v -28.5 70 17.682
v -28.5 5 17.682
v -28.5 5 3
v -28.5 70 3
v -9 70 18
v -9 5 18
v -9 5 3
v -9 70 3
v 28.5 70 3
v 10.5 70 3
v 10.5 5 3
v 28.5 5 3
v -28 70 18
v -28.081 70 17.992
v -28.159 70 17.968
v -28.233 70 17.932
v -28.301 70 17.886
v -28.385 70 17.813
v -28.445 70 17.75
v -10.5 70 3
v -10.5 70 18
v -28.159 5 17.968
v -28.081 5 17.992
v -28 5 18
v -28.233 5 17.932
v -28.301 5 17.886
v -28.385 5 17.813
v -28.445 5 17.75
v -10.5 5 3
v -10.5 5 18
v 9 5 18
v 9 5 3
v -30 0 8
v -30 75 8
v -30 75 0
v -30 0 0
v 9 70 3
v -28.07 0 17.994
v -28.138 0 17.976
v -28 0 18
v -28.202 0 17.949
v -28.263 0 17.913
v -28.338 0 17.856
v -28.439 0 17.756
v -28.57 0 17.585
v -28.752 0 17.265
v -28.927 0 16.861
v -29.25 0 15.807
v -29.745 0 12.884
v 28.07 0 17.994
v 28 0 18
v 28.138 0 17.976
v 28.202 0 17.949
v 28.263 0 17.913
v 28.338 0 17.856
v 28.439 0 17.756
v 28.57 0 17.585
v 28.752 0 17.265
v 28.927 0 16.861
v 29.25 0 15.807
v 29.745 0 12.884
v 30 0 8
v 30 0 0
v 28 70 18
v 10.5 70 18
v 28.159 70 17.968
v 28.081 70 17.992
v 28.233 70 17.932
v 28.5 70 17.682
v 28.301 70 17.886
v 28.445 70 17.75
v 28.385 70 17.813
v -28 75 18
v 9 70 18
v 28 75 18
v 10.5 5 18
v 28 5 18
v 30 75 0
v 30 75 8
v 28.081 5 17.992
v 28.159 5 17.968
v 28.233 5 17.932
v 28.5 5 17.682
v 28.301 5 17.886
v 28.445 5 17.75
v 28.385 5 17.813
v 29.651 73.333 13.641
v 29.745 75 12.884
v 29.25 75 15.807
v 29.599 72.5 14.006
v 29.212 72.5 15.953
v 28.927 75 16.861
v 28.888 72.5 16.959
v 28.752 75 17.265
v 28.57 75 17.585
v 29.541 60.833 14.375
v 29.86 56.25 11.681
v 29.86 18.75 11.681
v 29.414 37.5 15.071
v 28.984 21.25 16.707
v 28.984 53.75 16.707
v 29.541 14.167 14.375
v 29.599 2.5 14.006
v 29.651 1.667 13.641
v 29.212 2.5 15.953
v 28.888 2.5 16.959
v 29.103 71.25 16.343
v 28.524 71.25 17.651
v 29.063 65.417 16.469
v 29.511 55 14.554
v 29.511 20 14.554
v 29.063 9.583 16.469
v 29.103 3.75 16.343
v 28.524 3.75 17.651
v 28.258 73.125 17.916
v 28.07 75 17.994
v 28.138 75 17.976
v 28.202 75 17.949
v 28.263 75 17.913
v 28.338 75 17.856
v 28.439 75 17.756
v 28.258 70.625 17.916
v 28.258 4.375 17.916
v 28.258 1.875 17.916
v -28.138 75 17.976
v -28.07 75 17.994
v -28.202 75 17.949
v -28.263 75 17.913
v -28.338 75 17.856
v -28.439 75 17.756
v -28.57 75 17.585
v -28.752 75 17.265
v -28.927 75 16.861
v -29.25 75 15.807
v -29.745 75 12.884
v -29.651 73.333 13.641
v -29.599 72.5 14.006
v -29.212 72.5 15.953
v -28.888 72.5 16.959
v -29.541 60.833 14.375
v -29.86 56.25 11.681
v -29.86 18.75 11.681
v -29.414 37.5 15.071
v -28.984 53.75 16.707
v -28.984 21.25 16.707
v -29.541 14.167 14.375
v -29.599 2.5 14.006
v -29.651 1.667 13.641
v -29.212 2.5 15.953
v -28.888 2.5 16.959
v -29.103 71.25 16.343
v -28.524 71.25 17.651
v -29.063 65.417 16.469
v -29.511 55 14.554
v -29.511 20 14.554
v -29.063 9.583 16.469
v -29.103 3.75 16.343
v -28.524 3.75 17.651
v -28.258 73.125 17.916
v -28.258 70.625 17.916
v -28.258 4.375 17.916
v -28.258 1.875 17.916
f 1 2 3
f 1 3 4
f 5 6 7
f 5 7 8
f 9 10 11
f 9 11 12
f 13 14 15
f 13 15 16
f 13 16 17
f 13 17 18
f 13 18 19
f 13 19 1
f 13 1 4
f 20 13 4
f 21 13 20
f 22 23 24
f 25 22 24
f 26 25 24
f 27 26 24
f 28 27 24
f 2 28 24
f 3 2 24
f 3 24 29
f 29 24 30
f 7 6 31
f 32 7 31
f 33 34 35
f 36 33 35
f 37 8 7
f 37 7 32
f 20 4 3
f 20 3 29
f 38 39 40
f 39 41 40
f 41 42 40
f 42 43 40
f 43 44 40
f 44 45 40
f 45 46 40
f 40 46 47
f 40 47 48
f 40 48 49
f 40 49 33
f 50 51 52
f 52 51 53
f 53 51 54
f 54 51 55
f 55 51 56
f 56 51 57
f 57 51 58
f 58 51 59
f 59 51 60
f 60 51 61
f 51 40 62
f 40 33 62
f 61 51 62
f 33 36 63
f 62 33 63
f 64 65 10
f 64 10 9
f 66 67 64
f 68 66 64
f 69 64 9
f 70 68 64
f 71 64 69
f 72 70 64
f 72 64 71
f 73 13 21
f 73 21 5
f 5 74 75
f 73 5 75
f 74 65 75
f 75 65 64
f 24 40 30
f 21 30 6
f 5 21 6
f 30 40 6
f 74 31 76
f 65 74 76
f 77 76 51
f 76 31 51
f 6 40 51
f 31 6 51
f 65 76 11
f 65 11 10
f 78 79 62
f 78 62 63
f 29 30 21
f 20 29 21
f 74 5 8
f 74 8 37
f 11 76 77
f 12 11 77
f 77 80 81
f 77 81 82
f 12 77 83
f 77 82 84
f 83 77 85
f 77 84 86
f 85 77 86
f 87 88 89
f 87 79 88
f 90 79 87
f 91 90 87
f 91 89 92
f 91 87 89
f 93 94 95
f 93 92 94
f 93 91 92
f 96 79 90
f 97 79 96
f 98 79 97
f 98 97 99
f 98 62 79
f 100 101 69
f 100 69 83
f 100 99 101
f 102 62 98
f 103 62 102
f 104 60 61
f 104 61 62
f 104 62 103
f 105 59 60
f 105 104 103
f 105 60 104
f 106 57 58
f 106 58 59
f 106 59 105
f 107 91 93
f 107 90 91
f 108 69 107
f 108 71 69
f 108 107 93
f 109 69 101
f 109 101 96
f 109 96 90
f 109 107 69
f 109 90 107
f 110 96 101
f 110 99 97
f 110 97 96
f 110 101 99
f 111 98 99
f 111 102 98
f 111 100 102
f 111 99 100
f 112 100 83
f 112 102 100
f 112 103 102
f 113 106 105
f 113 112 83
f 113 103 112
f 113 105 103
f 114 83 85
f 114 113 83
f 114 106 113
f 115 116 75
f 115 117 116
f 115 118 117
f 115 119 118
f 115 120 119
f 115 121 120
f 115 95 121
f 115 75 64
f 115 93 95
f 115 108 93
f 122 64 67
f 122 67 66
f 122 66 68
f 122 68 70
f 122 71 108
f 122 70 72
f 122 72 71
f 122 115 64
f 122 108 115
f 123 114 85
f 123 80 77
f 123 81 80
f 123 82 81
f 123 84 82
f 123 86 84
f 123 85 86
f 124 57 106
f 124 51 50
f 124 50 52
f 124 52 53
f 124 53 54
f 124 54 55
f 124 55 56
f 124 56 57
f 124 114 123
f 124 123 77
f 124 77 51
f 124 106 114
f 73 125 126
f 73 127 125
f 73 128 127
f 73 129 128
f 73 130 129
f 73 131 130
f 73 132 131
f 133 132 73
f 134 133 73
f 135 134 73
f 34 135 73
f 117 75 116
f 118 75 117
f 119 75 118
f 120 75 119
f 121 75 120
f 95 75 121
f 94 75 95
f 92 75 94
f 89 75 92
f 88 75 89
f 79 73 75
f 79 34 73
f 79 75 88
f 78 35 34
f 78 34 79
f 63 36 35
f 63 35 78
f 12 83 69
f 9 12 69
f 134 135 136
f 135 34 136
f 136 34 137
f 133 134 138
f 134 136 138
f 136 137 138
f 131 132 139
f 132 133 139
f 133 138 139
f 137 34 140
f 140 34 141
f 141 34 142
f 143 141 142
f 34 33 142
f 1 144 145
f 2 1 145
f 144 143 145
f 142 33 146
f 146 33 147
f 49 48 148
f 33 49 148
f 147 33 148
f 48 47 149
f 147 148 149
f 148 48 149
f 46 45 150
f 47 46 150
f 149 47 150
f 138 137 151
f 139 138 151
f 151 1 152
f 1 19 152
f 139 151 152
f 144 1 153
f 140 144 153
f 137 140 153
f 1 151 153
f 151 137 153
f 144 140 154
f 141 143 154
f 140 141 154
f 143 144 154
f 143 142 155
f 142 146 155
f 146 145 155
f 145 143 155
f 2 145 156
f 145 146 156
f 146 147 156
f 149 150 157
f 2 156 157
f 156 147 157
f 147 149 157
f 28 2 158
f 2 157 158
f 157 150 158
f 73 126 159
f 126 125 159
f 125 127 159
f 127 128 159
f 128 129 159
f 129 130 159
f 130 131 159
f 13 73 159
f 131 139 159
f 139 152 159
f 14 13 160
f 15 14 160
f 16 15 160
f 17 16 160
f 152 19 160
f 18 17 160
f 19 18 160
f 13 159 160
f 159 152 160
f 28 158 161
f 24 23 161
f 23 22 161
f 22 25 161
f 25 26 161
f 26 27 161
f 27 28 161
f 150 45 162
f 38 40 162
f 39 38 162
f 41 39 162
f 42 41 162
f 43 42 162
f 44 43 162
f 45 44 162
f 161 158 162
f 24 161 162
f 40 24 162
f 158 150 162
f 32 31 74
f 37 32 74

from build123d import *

# Parameters (mm, degrees)
SKETCH1_W           = 60
SKETCH1_H           = 18
BOSS_EXTRUDE1_DEPTH = 75
SKETCH2_W           = 18
SKETCH2_H           = 65
CUT_EXTRUDE1_DEPTH  = 15
FILLET1_SIZE        = 10
FILLET1_SIZE_2      = 2


with BuildPart() as part:
    # Sketch1 → Boss-Extrude1 (new body)
    with BuildSketch(Plane(origin=(0, 0, 0), x_dir=(1, 0, 0), z_dir=(0, 1, 0))):
        with Locations((0, -9)):
            Rectangle(SKETCH1_W, SKETCH1_H)
    extrude(amount=BOSS_EXTRUDE1_DEPTH)

    # Sketch2 → Cut-Extrude1 (cut)
    with BuildSketch(Plane.XY.offset(18)):
        with Locations((-19.5, 37.5)):
            Rectangle(SKETCH2_W, SKETCH2_H)
        with Locations((0, 37.5)):
            Rectangle(SKETCH2_W, SKETCH2_H)
        with Locations((19.5, 37.5)):
            Rectangle(SKETCH2_W, SKETCH2_H)
    extrude(amount=-CUT_EXTRUDE1_DEPTH, mode=Mode.SUBTRACT)

    # Fillet1
    # an asymmetric fillet: 10, 2 mm, written as the material it takes off along each edge
    with BuildSketch(Plane(origin=(-30, -25, 18), x_dir=(0, 0, -1), z_dir=(0, 1, 0))) as fillet1_piece_1:
        with BuildLine():
            Bezier((FILLET1_SIZE, 0), (0, 0), (0, -FILLET1_SIZE_2), weights=[1, 0.707106781, 1])
            Line((0, -FILLET1_SIZE_2), (0, 0))
            Line((0, 0), (FILLET1_SIZE, 0))
        make_face()
    extrude(amount=125, mode=Mode.SUBTRACT)
    with BuildSketch(Plane(origin=(30, -25, 18), x_dir=(0, 0, -1), z_dir=(0, 1, 0))) as fillet1_piece_2:
        with BuildLine():
            Bezier((FILLET1_SIZE, 0), (0, 0), (0, FILLET1_SIZE_2), weights=[1, 0.707106781, 1])
            Line((0, FILLET1_SIZE_2), (0, 0))
            Line((0, 0), (FILLET1_SIZE, 0))
        make_face()
    extrude(amount=125, mode=Mode.SUBTRACT)


solid = part.part
